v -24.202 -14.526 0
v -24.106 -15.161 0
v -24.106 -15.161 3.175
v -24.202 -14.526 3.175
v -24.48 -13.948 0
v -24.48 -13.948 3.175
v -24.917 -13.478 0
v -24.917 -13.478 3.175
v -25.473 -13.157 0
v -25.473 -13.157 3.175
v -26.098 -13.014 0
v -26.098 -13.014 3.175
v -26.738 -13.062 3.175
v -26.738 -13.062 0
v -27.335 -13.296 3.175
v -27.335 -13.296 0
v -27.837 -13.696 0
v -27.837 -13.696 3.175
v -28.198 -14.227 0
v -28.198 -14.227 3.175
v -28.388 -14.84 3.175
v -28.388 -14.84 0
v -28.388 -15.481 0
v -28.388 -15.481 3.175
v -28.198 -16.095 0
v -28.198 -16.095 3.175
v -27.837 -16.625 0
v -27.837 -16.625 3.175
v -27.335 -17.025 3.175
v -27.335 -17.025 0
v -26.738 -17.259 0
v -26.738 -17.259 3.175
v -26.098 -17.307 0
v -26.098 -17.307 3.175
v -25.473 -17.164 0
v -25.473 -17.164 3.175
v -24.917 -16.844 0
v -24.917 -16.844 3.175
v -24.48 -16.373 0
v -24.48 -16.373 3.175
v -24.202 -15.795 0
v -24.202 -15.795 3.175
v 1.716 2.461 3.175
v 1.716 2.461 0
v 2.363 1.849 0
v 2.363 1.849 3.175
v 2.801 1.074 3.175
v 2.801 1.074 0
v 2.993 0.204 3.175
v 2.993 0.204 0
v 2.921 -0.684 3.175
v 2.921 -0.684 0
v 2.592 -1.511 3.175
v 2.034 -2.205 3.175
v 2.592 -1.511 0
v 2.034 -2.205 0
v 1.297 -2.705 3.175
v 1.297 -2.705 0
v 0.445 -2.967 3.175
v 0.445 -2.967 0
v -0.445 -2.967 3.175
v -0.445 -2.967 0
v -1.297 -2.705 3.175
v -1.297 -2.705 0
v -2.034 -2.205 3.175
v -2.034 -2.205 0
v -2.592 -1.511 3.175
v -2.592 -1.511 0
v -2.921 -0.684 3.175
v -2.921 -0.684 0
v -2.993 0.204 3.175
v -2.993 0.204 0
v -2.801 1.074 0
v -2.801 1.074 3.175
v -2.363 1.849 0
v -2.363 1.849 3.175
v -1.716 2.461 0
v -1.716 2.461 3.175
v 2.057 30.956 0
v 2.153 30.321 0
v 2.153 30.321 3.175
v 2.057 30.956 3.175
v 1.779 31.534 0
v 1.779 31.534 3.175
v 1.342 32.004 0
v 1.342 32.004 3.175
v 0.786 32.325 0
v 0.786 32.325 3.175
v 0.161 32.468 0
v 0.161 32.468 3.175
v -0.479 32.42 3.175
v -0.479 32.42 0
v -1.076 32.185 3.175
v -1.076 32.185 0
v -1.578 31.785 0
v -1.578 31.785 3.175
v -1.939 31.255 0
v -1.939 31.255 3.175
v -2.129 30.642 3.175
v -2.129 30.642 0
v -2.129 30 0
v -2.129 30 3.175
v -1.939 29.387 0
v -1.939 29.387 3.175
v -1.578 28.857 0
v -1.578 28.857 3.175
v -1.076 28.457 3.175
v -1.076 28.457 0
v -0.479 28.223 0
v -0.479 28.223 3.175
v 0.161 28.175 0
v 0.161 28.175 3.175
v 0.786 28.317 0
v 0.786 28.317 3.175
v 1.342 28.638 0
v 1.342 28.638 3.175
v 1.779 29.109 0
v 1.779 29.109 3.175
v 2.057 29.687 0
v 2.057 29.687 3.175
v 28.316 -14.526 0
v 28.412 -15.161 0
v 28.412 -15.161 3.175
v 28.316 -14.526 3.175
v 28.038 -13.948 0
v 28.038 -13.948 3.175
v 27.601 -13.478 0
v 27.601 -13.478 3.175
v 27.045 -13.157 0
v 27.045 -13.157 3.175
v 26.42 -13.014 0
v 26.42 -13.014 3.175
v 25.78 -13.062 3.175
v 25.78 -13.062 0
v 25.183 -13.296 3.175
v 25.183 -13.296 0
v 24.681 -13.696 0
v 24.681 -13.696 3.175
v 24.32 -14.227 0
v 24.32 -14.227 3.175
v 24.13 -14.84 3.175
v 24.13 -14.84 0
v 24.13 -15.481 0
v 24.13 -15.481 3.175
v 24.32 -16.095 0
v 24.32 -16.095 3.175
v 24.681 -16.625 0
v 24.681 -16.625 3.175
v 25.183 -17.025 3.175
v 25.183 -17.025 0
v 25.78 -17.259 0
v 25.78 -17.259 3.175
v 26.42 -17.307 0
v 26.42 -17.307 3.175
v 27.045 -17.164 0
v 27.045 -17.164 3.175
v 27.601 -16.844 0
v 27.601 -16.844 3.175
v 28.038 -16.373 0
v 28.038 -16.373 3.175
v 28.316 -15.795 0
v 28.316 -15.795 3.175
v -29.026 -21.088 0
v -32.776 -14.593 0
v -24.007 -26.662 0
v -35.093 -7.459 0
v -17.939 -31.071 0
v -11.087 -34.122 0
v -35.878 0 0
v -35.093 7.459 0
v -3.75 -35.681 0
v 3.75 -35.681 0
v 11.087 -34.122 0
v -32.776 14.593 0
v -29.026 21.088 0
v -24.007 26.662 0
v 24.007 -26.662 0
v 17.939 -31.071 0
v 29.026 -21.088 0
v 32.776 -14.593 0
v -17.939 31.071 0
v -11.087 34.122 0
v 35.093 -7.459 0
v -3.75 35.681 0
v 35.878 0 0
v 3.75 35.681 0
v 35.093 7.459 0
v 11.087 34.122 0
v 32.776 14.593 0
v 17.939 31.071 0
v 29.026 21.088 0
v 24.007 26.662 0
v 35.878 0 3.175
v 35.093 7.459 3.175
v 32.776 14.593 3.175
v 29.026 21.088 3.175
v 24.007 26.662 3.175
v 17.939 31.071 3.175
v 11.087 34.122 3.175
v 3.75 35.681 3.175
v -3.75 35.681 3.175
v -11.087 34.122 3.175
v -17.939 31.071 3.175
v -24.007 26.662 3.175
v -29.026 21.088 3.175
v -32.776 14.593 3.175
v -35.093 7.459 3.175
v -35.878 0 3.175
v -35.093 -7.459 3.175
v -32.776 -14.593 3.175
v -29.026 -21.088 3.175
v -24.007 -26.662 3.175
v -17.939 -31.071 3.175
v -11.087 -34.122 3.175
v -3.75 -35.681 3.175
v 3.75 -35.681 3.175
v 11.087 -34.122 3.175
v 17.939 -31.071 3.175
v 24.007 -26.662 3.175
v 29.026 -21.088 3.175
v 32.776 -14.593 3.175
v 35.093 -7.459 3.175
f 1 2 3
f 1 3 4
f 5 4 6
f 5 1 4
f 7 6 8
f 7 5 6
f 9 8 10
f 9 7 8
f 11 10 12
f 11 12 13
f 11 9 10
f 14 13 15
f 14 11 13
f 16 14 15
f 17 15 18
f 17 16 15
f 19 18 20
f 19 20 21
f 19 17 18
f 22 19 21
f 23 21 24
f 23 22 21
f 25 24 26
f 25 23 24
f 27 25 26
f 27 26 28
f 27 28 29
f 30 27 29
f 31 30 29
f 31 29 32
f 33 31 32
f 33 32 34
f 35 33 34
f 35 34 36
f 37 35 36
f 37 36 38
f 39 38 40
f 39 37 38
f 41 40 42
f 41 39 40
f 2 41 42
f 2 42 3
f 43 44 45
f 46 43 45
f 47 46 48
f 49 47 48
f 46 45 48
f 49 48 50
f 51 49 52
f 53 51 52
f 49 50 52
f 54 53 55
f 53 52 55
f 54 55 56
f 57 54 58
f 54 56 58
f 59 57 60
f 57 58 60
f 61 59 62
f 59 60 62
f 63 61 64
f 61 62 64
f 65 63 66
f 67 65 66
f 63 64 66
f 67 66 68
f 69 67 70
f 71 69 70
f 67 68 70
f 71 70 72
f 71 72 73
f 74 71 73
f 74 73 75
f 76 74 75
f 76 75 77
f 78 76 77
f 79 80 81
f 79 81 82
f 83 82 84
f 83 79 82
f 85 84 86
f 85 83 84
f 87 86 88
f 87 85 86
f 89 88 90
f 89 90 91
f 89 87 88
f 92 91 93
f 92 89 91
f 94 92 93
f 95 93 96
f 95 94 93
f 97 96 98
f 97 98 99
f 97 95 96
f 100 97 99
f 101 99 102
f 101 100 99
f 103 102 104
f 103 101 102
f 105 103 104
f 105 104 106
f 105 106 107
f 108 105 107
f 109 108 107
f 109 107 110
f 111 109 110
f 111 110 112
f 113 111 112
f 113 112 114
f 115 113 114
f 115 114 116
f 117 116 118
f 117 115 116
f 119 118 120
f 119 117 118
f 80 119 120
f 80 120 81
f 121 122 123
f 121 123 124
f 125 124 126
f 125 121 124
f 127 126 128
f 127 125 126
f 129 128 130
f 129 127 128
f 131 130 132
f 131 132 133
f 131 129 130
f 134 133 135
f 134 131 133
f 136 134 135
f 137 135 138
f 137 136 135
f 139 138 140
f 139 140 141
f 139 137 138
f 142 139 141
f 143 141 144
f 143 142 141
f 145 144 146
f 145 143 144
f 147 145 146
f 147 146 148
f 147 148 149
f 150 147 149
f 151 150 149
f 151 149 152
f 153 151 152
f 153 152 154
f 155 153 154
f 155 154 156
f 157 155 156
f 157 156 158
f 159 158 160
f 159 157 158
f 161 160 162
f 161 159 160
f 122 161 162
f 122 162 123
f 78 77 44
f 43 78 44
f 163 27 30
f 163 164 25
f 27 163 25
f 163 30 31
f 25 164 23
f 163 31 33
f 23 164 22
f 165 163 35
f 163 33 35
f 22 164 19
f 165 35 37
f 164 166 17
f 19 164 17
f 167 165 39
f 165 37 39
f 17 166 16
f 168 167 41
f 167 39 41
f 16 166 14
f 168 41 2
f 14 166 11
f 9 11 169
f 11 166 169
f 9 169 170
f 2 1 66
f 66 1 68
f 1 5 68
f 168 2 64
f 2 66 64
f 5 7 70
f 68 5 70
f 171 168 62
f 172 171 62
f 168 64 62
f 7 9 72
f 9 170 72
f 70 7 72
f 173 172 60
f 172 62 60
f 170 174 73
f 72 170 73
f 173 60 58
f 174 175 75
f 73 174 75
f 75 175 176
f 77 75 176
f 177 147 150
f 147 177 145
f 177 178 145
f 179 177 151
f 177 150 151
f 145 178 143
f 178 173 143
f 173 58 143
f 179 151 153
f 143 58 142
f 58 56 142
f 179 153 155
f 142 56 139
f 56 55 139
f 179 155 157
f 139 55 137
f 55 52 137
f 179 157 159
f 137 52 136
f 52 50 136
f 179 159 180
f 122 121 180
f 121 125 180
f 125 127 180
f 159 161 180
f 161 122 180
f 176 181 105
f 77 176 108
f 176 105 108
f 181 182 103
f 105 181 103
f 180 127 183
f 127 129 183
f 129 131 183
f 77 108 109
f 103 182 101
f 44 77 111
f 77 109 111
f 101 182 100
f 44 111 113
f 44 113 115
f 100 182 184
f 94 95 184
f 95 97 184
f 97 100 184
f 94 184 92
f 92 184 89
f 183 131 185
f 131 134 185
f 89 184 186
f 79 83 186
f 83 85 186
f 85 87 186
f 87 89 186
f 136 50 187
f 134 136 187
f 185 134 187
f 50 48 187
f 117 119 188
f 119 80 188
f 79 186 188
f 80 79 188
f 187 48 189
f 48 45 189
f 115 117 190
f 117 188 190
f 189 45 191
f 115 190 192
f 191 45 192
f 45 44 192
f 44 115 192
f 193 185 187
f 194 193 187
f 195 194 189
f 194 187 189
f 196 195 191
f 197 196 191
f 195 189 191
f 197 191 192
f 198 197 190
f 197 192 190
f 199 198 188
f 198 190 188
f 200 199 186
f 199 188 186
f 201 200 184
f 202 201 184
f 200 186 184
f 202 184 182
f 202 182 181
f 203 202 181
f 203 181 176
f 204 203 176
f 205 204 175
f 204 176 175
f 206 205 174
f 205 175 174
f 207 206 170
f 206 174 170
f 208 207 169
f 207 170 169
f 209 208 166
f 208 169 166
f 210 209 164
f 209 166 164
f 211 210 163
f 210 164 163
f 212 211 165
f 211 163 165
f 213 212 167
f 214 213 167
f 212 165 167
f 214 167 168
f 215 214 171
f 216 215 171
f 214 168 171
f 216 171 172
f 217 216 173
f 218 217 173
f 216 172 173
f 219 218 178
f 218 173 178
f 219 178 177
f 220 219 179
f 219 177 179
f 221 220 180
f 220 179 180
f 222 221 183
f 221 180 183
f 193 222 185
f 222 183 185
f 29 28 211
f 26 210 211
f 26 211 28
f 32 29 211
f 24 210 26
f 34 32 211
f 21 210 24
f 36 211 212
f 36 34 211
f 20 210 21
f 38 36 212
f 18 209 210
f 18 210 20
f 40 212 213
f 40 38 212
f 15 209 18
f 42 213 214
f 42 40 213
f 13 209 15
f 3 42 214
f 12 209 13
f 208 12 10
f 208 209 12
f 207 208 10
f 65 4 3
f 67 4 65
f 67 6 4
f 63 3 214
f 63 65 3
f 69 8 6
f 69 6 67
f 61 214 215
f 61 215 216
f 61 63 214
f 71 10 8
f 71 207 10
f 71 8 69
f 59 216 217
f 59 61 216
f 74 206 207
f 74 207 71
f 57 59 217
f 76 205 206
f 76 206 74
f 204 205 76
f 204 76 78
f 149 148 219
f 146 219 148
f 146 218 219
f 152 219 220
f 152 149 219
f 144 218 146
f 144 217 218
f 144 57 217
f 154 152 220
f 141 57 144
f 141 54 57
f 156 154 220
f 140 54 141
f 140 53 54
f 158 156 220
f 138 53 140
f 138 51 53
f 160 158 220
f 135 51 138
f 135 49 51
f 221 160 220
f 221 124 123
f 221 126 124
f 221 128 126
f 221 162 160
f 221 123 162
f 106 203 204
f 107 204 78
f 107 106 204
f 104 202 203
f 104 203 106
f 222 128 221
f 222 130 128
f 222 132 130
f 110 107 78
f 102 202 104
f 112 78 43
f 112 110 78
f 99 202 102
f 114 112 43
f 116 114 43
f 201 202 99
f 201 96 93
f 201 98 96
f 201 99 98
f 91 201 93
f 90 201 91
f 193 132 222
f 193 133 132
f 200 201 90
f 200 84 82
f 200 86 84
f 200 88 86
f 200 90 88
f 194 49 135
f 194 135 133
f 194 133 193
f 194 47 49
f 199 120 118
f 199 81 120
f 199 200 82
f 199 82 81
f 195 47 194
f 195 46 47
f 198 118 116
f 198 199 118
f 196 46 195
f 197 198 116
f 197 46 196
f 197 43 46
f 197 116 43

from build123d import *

# Parameters (mm, degrees)
F0_R     = 35.8775
F0_R_2   = 2.15265
F1_DEPTH = 3.175


with BuildPart() as f1:
    # F0 (on Top) → F1 (new body)
    with BuildSketch(Plane.XY):
        Circle(F0_R)
        with Locations((-26.258973, -15.160625)):
            Circle(F0_R_2, mode=Mode.SUBTRACT)
        with BuildLine():
            ThreePointArc((1.715656, 2.460994), (0, -2.999994), (-1.715656, 2.460994))
            Line((-1.715656, 2.460994), (1.715656, 2.460994))
        make_face(mode=Mode.SUBTRACT)
        with Locations((26.258973, -15.160625)):
            Circle(F0_R_2, mode=Mode.SUBTRACT)
        with Locations((0, 30.32125)):
            Circle(F0_R_2, mode=Mode.SUBTRACT)
    extrude(amount=F1_DEPTH)


solid = f1.part
